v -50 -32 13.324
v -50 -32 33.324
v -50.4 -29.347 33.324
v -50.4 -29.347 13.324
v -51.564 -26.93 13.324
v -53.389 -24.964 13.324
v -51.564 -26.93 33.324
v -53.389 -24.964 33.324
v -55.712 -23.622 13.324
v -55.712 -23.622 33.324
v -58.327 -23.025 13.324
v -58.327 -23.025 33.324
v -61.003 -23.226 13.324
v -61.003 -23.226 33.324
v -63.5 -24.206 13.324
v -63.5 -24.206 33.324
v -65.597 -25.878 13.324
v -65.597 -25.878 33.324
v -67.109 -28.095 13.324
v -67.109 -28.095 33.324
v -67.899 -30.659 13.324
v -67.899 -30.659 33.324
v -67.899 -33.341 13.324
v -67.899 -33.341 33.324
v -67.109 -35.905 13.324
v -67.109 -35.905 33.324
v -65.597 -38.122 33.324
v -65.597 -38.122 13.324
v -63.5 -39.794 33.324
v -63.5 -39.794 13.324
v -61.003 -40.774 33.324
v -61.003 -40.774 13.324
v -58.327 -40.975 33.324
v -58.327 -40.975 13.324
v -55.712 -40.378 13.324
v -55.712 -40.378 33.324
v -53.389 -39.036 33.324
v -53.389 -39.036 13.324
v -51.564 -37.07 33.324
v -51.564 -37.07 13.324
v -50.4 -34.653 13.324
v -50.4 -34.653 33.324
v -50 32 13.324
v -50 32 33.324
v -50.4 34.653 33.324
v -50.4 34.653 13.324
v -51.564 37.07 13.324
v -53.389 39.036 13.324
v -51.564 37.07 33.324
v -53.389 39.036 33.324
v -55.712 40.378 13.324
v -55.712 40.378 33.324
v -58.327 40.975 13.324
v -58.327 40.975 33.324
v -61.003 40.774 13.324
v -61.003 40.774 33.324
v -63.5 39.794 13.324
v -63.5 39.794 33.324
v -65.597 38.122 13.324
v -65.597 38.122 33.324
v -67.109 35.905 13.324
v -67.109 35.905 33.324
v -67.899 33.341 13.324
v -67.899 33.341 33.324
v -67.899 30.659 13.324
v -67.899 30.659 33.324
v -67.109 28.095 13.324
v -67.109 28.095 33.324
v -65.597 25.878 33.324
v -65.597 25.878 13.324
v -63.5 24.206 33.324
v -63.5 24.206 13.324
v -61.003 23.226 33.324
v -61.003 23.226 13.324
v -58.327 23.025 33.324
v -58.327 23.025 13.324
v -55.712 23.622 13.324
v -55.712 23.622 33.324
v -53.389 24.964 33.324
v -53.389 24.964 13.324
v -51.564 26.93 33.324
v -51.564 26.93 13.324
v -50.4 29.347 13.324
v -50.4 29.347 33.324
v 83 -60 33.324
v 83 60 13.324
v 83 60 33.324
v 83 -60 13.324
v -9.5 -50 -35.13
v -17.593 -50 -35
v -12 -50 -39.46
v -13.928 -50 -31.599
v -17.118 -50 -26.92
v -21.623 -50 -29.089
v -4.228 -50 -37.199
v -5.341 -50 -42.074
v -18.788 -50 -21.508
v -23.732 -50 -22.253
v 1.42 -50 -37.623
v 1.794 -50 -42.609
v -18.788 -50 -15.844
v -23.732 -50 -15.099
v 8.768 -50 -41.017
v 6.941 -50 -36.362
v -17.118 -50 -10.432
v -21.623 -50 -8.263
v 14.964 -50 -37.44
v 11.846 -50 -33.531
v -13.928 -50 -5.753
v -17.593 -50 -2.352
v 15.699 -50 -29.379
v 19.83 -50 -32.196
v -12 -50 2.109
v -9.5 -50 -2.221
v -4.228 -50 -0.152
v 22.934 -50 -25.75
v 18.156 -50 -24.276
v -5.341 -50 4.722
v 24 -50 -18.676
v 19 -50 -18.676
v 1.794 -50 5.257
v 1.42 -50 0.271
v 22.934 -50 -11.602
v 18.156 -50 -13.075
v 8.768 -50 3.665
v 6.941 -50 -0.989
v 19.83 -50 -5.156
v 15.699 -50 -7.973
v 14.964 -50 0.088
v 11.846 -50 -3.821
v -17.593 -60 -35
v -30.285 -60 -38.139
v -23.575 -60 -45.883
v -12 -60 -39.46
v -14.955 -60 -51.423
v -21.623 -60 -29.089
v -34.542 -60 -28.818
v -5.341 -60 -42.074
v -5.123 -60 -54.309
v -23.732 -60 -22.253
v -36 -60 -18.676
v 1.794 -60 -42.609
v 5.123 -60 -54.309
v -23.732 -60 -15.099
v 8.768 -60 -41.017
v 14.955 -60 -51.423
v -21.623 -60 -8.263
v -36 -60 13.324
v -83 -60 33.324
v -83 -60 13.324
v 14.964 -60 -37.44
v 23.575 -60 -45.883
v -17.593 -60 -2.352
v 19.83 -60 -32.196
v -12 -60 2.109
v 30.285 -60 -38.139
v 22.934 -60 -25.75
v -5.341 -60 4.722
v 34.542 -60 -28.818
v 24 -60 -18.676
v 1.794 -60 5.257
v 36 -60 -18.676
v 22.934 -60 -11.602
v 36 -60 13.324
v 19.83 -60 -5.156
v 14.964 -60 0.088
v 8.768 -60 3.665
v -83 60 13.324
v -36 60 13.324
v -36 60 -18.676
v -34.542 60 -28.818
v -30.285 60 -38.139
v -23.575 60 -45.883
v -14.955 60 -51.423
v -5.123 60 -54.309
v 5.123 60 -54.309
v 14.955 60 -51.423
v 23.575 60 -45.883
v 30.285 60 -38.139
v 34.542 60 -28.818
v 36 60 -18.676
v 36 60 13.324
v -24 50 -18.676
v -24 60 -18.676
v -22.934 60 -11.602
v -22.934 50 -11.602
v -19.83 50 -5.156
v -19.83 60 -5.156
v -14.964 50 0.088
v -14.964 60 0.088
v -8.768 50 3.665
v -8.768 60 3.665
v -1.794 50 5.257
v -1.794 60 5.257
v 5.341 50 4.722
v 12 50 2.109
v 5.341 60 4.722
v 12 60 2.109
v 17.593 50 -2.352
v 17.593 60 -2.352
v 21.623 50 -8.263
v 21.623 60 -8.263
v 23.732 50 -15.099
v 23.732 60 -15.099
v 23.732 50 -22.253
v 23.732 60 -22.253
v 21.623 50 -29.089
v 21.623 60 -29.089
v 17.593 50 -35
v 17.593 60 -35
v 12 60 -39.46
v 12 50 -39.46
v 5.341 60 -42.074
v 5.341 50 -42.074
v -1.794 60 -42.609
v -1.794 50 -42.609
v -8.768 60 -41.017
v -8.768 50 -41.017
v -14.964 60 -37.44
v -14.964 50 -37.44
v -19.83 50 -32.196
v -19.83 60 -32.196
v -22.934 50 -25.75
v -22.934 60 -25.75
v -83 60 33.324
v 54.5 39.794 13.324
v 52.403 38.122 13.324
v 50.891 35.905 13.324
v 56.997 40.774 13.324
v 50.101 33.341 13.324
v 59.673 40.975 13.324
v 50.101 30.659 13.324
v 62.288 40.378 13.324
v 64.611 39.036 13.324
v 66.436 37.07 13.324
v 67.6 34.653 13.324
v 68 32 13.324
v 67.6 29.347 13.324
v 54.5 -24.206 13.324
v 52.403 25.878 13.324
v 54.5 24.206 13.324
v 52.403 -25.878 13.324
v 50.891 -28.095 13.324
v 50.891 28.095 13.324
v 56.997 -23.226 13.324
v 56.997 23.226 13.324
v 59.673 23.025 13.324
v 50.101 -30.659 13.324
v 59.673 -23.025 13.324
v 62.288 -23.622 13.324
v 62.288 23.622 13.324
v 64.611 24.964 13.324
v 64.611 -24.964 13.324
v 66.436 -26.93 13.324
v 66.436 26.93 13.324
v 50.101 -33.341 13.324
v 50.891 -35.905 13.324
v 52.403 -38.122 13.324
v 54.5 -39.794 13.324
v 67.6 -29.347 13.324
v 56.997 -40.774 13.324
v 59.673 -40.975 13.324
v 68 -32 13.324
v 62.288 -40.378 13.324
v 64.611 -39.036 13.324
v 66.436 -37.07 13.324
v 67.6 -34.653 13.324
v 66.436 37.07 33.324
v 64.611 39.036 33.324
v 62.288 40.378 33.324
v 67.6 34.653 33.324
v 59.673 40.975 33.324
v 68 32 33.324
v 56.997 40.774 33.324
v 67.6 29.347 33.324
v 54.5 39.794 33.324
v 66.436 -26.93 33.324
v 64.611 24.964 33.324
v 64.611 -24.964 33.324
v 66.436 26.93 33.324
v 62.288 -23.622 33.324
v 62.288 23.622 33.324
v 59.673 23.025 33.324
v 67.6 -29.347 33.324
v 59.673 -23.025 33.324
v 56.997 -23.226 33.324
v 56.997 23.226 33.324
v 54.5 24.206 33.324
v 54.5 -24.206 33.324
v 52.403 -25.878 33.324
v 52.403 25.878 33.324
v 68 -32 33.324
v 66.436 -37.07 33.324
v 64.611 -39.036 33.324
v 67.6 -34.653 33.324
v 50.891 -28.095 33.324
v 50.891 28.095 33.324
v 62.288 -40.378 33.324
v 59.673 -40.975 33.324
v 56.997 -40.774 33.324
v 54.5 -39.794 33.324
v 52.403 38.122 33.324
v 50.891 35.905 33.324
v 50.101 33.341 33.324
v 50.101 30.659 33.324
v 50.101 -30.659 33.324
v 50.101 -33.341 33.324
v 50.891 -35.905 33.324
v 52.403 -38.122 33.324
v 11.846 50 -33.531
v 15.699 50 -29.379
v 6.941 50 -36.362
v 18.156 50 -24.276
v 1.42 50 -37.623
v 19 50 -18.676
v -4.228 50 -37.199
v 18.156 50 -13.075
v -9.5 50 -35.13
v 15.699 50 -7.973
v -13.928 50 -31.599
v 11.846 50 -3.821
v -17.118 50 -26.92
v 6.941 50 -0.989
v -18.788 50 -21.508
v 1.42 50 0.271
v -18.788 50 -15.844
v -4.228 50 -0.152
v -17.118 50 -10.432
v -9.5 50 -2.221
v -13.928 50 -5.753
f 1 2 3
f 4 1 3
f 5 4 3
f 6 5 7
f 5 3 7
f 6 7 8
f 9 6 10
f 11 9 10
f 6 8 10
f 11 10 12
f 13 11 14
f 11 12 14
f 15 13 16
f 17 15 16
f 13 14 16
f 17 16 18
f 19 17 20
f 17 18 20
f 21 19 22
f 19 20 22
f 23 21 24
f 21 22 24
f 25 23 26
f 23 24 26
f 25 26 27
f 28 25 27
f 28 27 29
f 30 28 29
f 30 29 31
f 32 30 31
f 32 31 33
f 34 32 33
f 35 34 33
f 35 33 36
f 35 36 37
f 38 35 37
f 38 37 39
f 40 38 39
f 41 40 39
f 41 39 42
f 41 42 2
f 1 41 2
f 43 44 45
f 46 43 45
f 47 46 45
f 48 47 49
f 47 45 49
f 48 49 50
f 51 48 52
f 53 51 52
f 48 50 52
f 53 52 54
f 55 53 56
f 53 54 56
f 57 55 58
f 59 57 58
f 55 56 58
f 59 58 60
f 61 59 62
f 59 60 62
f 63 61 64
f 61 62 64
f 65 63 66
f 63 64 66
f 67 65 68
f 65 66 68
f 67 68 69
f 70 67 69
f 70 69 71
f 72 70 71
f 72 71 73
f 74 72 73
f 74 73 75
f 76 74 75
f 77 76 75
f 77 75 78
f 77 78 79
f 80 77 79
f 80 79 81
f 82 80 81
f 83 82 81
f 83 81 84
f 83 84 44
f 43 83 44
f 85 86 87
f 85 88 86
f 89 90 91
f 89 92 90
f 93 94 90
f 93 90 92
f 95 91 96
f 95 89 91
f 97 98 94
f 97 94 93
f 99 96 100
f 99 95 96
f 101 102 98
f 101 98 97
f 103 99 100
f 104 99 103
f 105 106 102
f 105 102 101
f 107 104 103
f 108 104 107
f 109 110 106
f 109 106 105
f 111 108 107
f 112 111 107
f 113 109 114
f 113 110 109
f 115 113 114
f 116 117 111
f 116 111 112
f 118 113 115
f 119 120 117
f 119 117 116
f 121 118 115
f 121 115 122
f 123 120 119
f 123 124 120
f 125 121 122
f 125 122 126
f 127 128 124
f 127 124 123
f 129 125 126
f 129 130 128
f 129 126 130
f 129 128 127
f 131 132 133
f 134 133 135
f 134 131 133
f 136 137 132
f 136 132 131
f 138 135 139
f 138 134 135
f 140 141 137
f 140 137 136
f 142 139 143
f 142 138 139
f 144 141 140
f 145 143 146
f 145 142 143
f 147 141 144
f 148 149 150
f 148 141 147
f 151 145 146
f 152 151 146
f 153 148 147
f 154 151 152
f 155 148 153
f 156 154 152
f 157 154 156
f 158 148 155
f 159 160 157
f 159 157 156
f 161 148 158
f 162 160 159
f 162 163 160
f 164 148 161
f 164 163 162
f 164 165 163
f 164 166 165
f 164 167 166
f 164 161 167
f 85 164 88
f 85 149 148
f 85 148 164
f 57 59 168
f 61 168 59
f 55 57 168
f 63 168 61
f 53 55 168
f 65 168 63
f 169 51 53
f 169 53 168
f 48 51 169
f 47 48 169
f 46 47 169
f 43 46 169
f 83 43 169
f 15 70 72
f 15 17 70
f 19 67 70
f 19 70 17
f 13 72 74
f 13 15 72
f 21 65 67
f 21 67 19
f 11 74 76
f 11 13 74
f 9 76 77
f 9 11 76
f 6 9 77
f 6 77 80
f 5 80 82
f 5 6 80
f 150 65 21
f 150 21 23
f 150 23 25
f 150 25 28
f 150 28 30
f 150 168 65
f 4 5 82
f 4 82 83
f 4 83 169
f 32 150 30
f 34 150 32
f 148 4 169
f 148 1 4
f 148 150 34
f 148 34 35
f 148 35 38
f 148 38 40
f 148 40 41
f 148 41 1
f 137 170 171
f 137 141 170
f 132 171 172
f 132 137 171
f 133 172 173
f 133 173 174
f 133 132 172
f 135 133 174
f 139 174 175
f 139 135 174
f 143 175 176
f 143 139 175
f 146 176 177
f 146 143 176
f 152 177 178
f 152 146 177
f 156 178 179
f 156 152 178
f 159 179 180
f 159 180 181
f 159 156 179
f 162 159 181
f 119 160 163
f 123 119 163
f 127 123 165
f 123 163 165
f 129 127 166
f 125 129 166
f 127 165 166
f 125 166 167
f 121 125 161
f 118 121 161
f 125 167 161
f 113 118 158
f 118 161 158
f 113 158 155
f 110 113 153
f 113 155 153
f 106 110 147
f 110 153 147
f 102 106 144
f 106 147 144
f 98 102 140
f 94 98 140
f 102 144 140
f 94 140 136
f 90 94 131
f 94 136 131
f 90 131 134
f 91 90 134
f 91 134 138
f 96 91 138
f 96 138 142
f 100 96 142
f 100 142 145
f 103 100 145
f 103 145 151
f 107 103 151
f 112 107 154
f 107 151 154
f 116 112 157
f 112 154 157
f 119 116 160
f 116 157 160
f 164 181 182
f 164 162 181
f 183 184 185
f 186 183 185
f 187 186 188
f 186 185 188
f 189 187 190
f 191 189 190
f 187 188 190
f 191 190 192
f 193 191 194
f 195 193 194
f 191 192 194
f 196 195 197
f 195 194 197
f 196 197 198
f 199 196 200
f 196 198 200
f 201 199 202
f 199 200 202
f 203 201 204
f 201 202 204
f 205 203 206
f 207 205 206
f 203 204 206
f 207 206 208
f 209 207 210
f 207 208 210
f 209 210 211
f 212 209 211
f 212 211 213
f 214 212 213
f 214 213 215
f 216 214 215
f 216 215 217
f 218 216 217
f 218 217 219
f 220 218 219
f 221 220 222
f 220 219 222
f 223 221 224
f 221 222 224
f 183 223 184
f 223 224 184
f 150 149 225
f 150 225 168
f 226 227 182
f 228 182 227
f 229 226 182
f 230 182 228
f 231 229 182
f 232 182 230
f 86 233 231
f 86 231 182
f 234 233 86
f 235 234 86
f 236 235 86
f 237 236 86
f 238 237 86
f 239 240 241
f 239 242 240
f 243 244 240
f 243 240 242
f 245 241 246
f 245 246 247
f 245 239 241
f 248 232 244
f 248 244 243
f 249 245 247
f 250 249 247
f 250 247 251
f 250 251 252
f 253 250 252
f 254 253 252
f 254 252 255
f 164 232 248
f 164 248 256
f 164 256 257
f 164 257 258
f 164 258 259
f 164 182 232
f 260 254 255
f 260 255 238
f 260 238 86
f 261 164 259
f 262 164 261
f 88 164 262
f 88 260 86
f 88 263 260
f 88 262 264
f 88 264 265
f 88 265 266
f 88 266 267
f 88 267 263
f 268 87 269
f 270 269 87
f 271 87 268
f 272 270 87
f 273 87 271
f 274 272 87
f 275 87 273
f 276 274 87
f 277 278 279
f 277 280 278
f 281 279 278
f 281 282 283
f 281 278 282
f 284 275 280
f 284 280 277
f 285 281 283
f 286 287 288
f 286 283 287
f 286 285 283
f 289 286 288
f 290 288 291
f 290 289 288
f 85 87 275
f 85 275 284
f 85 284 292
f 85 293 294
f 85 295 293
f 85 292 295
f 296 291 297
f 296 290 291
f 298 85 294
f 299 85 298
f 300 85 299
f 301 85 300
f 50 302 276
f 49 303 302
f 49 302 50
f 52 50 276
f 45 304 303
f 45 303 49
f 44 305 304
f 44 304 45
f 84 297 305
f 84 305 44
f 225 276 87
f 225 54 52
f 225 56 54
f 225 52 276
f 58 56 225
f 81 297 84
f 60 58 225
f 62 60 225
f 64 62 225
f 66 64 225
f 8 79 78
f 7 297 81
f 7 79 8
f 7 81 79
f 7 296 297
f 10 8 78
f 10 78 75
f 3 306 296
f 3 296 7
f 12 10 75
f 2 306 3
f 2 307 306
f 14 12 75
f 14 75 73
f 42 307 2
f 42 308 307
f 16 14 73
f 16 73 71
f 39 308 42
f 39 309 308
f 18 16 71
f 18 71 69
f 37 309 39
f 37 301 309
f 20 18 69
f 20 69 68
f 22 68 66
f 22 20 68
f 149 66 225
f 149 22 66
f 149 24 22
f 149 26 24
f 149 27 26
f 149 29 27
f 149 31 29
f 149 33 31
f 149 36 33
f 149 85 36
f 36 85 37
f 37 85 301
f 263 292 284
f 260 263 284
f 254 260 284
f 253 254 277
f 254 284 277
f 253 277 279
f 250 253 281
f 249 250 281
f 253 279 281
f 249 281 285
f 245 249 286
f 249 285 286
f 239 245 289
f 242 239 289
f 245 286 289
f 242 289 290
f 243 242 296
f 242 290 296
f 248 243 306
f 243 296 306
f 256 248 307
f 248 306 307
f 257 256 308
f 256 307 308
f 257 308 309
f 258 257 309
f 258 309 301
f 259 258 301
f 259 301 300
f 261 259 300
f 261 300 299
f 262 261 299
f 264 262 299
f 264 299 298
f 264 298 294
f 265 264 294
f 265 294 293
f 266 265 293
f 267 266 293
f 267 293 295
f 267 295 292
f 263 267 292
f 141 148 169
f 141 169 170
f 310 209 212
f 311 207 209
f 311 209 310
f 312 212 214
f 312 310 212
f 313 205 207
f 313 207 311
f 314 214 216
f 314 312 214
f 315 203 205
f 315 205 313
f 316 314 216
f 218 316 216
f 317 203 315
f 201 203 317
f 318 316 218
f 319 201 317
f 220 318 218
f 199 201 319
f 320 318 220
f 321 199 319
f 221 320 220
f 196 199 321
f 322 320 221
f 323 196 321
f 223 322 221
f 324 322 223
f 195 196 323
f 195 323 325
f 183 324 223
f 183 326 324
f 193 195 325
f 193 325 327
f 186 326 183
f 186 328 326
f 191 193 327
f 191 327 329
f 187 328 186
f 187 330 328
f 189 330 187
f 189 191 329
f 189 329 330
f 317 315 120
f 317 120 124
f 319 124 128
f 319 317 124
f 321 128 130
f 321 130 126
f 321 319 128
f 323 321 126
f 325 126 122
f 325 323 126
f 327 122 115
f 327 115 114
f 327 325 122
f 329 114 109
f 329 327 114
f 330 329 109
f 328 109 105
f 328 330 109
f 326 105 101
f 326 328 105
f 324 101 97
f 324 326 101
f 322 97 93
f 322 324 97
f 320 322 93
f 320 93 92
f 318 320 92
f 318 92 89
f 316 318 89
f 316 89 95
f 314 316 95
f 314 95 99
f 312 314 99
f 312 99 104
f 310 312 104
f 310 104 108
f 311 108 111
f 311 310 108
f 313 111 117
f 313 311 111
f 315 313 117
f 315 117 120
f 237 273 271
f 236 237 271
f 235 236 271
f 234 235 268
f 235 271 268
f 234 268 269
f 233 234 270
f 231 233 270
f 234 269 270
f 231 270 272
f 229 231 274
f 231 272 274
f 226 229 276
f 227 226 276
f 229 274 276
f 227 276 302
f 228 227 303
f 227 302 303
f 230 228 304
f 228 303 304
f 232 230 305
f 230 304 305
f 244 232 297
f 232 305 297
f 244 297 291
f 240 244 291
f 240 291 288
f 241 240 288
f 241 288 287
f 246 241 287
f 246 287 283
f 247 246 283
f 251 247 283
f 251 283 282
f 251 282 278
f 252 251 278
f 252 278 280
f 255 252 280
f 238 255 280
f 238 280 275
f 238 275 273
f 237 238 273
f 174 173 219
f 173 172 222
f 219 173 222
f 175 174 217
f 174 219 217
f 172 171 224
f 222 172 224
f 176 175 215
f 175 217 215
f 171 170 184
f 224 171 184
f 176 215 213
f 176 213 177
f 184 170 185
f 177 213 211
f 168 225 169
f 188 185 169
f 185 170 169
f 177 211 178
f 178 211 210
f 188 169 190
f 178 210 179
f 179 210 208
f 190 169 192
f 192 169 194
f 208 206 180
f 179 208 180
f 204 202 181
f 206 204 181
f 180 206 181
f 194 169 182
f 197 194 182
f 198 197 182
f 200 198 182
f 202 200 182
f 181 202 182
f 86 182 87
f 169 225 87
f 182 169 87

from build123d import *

# Parameters (mm, degrees)
F0_R     = 24
F0_R_2   = 19
F1_DEPTH = 60
F2_R     = 24
F2_R_2   = 19
F3_DEPTH = 10
F4_R     = 24
F4_R_2   = 19
F5_DEPTH = 10
F6_R     = 9
F7_DEPTH = 25


with BuildPart() as f1:
    # F0 (on Front) → F1 (new body, symmetric)
    with BuildSketch(Plane.XZ):
        with BuildLine():
            Line((83, 13.3241766691), (83, 33.3241766691))
            Line((83, 33.3241766691), (-83, 33.3241766691))
            Line((-83, 33.3241766691), (-83, 13.3241766691))
            Line((-83, 13.3241766691), (-36, 13.3241766691))
            Line((-36, 13.3241766691), (-36, -18.6758233309))
            ThreePointArc((-36, -18.6758233309), (0, -54.6758233309), (36, -18.6758233309))
            Line((36, -18.6758233309), (36, 13.3241766691))
            Line((36, 13.3241766691), (83, 13.3241766691))
        make_face()
        with Locations((0, -18.6758233309)):
            Circle(F0_R, mode=Mode.SUBTRACT)
        with Locations((0, -18.6758233309)):
            Circle(F0_R)
        with Locations((0, -18.6758233309)):
            Circle(F0_R_2, mode=Mode.SUBTRACT)
    extrude(amount=F1_DEPTH, both=True)

    # F2 (on face) → F3 (cut)
    with BuildSketch(Plane.XZ.offset(60)):
        with Locations((0, -18.6758233309)):
            Circle(F2_R)
        with Locations((0, -18.6758233309)):
            Circle(F2_R_2, mode=Mode.SUBTRACT)
    extrude(amount=-F3_DEPTH, mode=Mode.SUBTRACT)

    # F4 (on face) → F5 (cut)
    with BuildSketch(Plane(origin=(0, 60, 0), x_dir=(-1, 0, 0), z_dir=(0, 1, 0))):
        with Locations((0, -18.6758233309)):
            Circle(F4_R)
        with Locations((0, -18.6758233309)):
            Circle(F4_R_2, mode=Mode.SUBTRACT)
    extrude(amount=-F5_DEPTH, mode=Mode.SUBTRACT)

    # F6 (on face) → F7 (cut)
    with BuildSketch(Plane.XY.offset(33.3241766691)):
        with Locations((-59, -32)):
            Circle(F6_R)
        with Locations((-59, 32)):
            Circle(F6_R)
        with Locations((59, -32)):
            Circle(F6_R)
        with Locations((59, 32)):
            Circle(F6_R)
    extrude(amount=-F7_DEPTH, mode=Mode.SUBTRACT)


solid = f1.part
